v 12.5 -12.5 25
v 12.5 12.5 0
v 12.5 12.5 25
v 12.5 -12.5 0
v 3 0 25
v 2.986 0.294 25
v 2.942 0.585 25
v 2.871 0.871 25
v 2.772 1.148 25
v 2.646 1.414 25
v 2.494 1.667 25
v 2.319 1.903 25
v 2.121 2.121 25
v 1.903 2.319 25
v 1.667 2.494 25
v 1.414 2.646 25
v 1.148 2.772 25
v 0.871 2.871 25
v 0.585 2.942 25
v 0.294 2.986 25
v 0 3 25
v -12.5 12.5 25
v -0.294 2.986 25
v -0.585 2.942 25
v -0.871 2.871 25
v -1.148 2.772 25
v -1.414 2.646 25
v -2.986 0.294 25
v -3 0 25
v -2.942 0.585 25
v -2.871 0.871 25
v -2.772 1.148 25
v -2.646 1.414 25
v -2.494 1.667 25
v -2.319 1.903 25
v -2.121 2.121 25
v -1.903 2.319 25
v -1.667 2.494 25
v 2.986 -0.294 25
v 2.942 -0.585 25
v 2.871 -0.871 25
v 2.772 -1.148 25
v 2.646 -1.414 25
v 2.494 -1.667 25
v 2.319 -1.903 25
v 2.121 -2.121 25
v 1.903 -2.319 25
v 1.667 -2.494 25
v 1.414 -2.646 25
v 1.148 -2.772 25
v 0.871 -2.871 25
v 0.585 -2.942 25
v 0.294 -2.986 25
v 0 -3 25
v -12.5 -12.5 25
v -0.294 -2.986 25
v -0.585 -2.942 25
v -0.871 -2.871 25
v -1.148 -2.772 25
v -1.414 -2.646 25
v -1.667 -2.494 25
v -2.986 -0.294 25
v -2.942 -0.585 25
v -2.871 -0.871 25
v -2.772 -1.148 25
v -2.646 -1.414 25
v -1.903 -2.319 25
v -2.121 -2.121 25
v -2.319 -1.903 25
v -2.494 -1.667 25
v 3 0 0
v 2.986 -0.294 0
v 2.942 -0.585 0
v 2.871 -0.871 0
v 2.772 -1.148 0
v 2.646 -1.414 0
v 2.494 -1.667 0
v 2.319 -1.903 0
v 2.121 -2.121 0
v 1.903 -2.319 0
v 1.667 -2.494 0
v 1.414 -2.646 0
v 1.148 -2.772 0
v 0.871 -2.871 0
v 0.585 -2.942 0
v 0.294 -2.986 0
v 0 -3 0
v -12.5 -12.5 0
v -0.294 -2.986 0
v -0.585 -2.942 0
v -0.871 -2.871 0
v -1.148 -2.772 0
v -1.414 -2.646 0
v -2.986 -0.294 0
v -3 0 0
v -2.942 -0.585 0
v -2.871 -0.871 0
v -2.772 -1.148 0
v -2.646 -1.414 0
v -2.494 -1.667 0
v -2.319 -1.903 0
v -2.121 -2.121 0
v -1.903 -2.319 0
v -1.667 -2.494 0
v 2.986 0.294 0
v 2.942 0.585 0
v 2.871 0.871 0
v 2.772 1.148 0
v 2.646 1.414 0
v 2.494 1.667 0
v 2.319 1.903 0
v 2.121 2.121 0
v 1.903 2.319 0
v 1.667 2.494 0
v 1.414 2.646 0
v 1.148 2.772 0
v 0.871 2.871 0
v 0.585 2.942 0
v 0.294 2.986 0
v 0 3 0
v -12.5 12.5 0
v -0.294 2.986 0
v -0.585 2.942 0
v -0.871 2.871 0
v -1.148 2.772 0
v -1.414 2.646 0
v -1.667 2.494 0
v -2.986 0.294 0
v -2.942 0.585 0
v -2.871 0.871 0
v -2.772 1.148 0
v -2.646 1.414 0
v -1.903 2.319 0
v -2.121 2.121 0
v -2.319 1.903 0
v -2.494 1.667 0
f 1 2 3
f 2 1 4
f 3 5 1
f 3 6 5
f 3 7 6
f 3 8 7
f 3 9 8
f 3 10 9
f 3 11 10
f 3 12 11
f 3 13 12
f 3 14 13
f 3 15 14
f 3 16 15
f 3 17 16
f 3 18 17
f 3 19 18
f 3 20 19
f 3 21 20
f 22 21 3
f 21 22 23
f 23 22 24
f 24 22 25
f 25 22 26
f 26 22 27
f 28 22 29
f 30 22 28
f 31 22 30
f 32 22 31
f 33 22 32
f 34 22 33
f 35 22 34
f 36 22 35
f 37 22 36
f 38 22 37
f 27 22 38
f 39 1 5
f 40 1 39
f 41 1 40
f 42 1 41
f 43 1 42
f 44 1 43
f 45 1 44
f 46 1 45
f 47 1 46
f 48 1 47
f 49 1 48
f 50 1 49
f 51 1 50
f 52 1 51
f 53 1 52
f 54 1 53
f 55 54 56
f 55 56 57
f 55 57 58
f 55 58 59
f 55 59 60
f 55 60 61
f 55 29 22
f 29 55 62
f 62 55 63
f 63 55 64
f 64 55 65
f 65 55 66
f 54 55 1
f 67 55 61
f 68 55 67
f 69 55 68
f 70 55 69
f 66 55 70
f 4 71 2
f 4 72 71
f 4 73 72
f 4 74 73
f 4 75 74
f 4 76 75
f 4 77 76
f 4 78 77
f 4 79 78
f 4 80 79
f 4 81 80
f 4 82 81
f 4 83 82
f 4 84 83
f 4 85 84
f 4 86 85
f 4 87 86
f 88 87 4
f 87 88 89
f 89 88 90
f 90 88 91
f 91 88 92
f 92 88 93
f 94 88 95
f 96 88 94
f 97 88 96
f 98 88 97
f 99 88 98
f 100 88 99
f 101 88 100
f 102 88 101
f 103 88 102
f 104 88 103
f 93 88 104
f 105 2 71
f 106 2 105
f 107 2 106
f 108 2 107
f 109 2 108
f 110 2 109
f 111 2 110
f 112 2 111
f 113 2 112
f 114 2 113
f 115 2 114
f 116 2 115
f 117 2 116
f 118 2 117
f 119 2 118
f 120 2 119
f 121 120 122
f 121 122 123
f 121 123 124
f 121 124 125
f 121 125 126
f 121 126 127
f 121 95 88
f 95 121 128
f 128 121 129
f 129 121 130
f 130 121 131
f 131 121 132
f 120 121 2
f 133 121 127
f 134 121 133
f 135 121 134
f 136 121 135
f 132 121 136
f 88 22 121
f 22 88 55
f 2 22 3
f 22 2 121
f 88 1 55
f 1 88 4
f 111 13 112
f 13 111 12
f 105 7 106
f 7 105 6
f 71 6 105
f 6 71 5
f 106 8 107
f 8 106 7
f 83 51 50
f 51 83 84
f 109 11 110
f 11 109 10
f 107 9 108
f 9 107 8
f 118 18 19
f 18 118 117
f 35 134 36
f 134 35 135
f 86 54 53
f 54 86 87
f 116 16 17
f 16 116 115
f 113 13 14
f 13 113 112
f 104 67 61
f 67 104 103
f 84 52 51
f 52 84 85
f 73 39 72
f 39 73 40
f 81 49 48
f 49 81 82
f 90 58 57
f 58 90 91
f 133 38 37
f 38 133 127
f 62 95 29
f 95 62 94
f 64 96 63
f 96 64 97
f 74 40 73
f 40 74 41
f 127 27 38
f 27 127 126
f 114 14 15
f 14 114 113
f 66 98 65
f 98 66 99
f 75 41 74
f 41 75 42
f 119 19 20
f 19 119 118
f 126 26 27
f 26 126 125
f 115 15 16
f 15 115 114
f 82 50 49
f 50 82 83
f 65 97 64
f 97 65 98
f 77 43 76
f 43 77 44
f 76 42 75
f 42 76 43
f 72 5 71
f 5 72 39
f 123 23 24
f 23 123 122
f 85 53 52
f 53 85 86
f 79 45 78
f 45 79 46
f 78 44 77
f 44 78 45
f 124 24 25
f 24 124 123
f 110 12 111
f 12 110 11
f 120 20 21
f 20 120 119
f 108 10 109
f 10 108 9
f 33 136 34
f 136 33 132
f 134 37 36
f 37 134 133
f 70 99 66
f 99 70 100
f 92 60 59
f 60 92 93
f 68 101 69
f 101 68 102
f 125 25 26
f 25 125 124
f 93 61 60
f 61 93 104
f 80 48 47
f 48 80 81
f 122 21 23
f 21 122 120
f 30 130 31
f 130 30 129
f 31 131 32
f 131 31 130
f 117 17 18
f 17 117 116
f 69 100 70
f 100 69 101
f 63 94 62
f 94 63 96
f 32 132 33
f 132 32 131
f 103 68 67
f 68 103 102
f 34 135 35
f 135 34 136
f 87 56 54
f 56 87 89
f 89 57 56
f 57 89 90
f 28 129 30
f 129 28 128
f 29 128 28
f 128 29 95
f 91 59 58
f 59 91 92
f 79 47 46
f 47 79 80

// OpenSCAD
/* [Dimensions] */
// Edge length of the cube
cube_size = 25; // [10:100]
// Diameter of the vertical through-hole
hole_diameter = 6; // [2:0.5:20]

/* [Quality] */
// Global curve resolution
$fn = 64;

// Derived values
hole_radius = hole_diameter / 2;

difference() {
    // Cube sitting on the build plate, centered in X/Y
    translate([0, 0, cube_size / 2])
        cube(cube_size, center = true);

    // Vertical through-hole, extended past both faces
    translate([0, 0, -0.5])
        cylinder(h = cube_size + 1, r = hole_radius);
}
